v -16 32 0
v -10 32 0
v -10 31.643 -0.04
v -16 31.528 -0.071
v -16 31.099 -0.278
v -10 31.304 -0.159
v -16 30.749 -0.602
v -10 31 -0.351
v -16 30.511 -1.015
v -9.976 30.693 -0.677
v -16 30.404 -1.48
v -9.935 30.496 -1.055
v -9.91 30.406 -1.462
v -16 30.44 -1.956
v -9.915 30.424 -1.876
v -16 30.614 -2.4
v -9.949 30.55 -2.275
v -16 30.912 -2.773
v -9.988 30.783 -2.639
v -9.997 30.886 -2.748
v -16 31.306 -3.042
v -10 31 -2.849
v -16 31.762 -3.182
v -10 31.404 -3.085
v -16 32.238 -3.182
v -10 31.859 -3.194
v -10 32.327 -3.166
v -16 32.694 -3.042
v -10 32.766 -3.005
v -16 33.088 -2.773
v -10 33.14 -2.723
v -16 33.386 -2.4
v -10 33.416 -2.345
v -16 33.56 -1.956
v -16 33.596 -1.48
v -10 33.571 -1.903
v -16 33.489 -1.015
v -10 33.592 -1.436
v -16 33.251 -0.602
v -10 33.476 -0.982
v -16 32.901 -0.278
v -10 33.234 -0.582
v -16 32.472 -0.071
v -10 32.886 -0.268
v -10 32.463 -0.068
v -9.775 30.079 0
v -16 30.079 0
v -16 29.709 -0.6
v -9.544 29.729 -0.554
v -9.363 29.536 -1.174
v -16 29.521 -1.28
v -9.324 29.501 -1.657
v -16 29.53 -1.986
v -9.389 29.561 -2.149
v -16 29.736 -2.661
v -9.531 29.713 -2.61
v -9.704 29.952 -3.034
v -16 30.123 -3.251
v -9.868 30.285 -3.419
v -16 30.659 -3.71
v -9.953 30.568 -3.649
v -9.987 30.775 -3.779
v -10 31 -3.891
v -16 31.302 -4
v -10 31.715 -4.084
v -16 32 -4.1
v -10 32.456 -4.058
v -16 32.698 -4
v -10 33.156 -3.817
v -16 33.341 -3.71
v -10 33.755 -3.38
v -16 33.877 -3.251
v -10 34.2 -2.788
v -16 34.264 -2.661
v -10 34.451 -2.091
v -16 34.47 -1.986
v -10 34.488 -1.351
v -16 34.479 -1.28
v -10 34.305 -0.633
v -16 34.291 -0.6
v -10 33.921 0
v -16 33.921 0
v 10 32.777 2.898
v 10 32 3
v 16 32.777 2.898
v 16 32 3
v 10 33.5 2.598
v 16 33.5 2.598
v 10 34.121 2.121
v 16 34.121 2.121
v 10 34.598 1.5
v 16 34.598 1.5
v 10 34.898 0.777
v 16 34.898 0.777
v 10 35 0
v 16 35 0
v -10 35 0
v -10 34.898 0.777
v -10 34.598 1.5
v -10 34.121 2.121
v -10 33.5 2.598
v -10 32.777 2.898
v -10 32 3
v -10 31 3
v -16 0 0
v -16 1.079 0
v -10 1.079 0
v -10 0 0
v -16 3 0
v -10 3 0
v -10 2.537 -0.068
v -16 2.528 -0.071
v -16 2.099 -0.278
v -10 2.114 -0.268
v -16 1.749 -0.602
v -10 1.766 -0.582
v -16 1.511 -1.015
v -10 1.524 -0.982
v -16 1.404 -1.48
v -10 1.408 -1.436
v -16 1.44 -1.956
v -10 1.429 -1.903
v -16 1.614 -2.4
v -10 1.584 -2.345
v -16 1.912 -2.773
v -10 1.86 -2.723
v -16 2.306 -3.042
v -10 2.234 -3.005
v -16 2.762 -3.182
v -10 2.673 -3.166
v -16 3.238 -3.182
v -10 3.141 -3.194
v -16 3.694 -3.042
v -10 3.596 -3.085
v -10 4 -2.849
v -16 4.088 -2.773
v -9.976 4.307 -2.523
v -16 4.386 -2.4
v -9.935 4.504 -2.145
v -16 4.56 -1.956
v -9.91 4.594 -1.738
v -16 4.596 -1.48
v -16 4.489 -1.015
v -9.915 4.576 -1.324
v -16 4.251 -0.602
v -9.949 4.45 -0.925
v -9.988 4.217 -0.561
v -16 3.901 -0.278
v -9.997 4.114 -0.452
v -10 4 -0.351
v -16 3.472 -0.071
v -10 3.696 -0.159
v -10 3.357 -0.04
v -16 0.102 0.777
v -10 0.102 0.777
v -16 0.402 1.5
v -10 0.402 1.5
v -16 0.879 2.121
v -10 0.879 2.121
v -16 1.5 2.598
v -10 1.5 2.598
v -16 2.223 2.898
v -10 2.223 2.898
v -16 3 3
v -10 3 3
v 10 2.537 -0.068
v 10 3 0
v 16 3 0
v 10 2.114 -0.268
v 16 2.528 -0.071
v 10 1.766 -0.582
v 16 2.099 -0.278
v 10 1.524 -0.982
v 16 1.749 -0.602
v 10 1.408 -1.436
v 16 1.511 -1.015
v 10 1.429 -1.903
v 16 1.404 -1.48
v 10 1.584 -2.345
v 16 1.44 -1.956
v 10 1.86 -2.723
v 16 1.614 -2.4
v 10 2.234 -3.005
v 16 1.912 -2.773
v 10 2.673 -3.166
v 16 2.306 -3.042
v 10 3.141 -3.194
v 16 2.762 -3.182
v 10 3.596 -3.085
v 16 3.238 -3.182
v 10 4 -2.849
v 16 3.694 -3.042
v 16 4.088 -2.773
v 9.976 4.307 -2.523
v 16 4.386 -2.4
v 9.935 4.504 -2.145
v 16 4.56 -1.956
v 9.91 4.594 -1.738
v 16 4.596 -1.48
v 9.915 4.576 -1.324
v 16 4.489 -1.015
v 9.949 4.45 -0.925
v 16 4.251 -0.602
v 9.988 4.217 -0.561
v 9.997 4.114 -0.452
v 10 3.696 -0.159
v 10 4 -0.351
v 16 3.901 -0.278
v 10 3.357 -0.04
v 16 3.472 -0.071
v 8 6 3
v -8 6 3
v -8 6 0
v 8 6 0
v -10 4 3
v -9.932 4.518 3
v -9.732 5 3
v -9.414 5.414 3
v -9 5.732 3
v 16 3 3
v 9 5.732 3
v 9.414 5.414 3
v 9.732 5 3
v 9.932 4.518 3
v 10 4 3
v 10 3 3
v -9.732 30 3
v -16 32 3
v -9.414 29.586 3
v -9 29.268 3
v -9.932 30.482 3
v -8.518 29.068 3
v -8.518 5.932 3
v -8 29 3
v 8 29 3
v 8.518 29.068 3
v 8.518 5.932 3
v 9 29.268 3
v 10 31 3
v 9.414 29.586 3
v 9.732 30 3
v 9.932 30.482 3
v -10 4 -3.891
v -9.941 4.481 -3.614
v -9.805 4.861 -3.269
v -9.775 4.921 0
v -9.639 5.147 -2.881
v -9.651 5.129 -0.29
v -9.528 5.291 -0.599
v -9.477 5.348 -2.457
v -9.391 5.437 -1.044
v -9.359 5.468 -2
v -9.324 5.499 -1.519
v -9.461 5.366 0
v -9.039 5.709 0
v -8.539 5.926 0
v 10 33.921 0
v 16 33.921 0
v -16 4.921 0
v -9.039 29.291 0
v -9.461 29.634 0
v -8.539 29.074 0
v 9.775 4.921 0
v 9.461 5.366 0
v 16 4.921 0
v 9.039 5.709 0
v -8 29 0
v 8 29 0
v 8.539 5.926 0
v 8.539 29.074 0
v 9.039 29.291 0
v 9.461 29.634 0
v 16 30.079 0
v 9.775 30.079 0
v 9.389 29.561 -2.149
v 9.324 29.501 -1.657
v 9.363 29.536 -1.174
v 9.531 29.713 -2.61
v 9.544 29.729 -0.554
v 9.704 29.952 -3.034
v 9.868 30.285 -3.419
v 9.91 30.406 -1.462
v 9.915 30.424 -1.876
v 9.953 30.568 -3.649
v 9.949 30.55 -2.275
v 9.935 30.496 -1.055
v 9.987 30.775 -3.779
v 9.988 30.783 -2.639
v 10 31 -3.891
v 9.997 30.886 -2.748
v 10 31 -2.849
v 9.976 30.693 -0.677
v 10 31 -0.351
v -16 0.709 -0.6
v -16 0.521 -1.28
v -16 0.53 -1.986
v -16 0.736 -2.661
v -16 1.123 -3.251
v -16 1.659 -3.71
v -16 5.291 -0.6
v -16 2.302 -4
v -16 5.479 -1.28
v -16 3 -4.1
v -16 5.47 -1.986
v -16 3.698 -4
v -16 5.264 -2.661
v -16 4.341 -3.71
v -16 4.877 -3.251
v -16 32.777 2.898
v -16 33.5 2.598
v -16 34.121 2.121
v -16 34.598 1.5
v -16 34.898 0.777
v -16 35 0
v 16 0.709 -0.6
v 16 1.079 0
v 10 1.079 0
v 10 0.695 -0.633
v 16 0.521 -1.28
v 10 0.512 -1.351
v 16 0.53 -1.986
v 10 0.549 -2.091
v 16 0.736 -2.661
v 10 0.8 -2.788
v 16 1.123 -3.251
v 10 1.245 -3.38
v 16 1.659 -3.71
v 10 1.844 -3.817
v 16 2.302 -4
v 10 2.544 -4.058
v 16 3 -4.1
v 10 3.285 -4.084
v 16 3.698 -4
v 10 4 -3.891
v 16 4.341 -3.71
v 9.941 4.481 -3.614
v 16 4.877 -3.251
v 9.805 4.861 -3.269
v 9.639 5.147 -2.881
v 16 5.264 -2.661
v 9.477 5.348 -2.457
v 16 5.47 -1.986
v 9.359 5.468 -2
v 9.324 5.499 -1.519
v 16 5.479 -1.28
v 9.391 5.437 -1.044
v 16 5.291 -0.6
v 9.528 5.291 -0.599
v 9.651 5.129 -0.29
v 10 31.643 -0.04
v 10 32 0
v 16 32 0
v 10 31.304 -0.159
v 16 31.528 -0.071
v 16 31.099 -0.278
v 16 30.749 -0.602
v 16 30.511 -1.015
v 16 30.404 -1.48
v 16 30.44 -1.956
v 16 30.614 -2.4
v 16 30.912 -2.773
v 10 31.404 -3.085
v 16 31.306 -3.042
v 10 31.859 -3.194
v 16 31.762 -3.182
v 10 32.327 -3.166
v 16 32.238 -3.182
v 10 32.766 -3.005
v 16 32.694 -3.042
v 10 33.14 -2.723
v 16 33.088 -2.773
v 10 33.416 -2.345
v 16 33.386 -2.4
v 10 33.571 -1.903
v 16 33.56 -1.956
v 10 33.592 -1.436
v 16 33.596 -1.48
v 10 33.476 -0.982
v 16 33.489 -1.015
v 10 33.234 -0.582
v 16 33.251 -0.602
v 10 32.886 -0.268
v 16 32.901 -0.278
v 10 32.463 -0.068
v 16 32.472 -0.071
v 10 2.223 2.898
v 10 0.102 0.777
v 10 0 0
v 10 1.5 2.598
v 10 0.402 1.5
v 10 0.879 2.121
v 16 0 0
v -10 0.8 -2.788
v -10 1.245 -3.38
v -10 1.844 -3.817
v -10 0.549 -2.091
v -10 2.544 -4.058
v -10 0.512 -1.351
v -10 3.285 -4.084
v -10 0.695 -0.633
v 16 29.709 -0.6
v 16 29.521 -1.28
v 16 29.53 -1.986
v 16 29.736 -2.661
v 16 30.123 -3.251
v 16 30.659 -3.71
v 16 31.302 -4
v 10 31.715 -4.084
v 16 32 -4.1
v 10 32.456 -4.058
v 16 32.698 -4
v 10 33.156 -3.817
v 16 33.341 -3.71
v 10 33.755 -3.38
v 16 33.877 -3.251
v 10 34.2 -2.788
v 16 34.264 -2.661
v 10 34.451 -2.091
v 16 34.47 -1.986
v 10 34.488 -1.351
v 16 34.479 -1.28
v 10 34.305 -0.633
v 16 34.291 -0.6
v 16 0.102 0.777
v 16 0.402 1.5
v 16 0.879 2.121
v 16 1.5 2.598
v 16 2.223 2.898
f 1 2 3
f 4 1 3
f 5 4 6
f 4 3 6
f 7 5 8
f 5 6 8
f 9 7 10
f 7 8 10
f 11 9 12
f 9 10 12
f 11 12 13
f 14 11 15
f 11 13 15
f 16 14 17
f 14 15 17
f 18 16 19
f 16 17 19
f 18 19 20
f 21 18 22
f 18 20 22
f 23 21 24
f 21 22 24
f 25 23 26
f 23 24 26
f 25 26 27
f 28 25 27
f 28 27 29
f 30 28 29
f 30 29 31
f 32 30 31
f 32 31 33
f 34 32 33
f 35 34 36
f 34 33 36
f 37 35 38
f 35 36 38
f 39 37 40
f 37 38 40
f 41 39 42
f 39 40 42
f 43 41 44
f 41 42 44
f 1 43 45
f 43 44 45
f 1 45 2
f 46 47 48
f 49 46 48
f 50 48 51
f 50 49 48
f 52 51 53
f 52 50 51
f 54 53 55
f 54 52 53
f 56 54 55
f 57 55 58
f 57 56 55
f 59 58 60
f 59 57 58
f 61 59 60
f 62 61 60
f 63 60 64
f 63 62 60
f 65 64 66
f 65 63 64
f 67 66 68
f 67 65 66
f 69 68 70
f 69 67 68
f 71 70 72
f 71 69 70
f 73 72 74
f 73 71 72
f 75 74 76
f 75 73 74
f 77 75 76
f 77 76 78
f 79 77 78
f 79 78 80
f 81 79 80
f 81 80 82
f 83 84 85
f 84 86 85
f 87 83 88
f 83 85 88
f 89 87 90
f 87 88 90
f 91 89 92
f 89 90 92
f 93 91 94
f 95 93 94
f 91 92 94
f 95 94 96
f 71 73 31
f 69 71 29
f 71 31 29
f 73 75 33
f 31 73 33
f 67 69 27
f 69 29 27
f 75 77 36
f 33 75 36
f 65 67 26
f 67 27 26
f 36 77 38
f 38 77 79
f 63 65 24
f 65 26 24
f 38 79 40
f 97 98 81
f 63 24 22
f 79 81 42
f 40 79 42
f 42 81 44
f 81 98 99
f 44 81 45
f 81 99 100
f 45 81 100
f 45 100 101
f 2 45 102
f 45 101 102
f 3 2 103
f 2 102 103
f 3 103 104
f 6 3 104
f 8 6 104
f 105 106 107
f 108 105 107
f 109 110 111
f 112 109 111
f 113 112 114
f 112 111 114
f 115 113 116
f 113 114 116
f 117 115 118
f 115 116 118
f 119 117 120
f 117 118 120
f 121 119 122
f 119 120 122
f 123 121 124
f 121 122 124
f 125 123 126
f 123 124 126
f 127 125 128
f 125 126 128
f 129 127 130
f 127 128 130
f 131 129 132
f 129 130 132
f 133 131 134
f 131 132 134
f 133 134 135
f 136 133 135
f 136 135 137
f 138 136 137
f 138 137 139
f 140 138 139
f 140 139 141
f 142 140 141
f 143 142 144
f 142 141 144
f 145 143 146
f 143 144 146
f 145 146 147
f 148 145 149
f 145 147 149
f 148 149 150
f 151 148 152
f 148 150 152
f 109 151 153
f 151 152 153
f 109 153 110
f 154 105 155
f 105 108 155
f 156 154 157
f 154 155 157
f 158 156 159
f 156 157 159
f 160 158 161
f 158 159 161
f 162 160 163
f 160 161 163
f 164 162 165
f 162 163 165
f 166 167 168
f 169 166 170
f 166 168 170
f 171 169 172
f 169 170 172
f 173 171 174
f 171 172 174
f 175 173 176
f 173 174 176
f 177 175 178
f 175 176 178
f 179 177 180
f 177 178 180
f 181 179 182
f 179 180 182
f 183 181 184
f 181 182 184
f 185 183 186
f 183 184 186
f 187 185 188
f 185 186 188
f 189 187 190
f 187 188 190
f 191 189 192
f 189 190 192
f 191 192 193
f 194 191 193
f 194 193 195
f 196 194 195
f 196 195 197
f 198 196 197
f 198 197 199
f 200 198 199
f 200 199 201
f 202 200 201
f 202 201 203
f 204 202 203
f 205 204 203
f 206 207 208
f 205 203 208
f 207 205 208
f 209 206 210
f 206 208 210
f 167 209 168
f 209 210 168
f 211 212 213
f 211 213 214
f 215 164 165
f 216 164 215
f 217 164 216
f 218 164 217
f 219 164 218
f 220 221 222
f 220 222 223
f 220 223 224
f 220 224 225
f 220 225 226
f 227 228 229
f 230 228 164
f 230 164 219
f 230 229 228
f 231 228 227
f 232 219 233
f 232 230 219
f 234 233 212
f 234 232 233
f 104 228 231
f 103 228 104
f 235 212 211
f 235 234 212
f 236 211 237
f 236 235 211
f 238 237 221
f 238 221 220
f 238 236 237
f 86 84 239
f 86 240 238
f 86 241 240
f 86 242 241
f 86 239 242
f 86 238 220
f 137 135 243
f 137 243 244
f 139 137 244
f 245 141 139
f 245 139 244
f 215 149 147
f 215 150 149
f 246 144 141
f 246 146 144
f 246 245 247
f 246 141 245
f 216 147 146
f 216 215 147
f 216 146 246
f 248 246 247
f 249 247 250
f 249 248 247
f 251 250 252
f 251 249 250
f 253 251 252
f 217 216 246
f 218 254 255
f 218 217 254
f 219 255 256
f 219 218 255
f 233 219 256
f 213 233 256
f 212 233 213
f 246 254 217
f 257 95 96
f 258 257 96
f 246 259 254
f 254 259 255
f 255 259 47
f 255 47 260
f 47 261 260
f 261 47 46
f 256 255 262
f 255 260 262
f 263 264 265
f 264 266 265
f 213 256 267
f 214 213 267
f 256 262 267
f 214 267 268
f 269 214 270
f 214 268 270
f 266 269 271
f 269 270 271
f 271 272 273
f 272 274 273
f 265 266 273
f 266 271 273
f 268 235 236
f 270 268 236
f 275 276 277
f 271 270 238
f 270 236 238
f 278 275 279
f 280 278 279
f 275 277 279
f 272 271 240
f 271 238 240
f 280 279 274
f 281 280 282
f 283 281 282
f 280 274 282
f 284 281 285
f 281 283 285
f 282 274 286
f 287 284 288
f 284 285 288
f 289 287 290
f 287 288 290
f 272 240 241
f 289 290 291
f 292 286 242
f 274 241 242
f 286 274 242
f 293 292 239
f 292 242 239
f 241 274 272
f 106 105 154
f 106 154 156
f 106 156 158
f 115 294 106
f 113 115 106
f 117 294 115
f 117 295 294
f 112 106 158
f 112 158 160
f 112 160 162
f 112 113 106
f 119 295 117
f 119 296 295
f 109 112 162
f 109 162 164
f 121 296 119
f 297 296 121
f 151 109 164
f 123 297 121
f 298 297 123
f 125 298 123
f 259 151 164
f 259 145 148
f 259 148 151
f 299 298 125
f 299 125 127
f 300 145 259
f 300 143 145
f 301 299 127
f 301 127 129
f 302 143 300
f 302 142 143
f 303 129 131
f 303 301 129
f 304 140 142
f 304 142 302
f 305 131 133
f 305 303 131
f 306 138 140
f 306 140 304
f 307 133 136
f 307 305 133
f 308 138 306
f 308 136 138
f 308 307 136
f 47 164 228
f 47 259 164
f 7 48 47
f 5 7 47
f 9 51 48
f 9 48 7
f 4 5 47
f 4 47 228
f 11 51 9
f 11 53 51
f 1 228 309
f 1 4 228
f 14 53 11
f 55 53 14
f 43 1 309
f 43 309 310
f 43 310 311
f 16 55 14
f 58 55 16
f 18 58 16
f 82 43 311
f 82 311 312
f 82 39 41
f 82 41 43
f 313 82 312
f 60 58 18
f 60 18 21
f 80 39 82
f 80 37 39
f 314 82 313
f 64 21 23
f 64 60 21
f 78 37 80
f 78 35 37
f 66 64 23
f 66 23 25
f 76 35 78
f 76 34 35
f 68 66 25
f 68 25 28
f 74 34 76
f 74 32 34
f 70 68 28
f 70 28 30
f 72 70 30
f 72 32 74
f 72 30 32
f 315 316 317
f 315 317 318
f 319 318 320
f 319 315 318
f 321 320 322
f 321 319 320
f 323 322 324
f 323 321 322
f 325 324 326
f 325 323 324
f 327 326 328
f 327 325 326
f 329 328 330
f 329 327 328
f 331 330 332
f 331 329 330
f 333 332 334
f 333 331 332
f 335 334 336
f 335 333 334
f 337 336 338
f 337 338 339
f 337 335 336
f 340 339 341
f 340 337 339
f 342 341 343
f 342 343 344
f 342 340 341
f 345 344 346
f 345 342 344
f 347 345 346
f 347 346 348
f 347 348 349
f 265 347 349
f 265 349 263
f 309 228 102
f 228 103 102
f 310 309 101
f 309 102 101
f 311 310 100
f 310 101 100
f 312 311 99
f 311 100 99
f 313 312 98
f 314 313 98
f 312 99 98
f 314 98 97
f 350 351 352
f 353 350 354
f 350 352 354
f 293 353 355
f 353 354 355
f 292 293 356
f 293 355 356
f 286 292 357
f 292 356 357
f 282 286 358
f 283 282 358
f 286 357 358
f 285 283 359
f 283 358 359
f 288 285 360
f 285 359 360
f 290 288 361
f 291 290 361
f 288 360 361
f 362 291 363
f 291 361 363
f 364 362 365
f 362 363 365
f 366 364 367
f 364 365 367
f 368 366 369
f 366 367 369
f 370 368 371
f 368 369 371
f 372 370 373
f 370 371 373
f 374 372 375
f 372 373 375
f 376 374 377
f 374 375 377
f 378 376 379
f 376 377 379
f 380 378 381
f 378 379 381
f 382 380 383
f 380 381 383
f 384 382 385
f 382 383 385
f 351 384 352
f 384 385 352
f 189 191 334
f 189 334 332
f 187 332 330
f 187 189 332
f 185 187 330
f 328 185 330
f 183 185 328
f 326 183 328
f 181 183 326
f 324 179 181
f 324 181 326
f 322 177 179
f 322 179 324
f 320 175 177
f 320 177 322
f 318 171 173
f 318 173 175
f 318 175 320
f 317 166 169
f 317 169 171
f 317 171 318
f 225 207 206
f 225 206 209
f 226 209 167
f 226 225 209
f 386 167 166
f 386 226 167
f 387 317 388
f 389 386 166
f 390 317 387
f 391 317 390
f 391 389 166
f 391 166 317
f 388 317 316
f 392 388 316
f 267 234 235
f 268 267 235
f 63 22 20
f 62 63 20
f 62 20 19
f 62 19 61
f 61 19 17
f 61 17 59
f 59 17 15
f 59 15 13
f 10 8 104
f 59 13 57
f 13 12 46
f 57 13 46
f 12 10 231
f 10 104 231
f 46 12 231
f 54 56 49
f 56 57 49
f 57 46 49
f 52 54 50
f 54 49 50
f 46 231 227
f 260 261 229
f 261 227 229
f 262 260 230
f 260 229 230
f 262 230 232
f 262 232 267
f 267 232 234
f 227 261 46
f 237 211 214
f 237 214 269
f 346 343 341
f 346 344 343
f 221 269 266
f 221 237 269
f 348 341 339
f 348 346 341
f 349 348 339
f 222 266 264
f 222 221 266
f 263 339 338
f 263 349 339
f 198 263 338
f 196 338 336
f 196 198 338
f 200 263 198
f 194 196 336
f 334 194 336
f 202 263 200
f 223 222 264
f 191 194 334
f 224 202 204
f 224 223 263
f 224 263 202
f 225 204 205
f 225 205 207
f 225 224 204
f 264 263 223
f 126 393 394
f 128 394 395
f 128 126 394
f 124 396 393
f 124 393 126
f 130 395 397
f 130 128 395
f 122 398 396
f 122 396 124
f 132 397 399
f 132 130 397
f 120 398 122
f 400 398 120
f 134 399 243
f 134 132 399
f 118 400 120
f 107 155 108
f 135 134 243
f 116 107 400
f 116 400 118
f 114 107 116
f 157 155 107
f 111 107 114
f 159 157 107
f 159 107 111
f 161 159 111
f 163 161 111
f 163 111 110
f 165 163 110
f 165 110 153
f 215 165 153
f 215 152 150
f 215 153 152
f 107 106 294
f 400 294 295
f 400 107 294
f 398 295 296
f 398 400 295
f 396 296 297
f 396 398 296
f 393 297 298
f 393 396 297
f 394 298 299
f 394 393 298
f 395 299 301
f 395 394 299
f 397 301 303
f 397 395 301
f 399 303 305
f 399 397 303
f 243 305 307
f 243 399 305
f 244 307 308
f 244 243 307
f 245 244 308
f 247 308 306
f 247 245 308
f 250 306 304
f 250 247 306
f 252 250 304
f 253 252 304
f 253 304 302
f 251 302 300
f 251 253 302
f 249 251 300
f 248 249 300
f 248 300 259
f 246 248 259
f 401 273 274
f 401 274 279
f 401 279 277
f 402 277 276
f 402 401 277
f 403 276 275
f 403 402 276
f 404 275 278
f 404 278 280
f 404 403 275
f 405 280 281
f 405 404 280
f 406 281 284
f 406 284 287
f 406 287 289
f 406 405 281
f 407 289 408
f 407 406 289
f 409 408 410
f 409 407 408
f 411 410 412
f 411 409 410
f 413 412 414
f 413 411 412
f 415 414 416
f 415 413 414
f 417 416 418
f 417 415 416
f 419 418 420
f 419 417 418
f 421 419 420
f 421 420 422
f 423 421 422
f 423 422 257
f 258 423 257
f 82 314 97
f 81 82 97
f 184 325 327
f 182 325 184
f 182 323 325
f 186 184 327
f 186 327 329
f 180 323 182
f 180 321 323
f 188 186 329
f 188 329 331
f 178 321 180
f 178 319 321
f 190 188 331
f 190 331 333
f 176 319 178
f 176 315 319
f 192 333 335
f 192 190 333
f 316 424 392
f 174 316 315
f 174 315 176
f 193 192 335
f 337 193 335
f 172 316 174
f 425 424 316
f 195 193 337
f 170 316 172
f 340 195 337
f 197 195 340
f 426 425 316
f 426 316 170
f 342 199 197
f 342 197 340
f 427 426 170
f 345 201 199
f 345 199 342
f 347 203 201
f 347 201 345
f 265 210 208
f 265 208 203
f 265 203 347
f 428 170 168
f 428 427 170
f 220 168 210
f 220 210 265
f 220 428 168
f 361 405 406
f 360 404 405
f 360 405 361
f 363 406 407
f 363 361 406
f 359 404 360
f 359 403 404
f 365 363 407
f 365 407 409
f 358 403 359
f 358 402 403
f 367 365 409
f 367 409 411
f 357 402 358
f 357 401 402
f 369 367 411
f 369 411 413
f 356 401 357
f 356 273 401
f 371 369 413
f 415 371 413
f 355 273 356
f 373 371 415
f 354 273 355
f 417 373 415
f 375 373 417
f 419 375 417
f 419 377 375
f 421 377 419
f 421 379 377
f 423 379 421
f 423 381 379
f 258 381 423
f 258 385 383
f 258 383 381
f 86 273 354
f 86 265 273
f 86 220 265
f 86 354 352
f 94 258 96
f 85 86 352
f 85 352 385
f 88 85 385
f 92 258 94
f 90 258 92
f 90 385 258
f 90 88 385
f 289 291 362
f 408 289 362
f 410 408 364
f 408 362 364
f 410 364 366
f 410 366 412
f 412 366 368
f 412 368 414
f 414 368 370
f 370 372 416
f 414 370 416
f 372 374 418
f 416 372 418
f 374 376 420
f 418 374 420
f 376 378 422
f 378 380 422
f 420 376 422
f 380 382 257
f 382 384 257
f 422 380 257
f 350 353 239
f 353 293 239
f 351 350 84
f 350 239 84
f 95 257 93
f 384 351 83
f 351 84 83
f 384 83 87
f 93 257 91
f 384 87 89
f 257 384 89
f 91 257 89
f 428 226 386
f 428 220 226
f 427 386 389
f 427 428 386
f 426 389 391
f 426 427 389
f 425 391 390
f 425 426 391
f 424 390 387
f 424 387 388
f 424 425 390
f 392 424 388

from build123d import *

# Parameters (mm, degrees)
SKETCH1_W                       = 32
SKETCH1_H                       = 35
BOSS_EXTRUDE1_DEPTH             = 3
BOSS_EXTRUDE2_REACH             = 40.601
SKETCH4_R                       = 2.5
SKETCH4_R_2                     = 1.6
BOSS_EXTRUDE2_DIRECTION_2_REACH = 40.601
CUT_EXTRUDE1_DEPTH              = 40.133233958
FILLET1_R                       = 3


with BuildPart() as part:
    # Sketch1 → Boss-Extrude1 (new body)
    with BuildSketch(Plane.XY):
        with Locations((0, 17.5)):
            Rectangle(SKETCH1_W, SKETCH1_H)
    extrude(amount=BOSS_EXTRUDE1_DEPTH)

    # Boss-Extrude2: up to this face of the body (flat: up to its plane)
    boss_extrude2_end = Plane(part.part.faces().sort_by_distance((16, 17.5, 1.5))[0])
    # Sketch4 → Boss-Extrude2 (add, up to the picked face)
    with BuildSketch(Plane(origin=(0, 0, 0), x_dir=(0, 0, -1), z_dir=(1, 0, 0)), mode=Mode.PRIVATE) as boss_extrude2_sk1:
        with Locations((1.6, 32)):
            Circle(SKETCH4_R)
        with Locations(Location((1.6, 32, 0), (0, 0, 180))):
            Circle(SKETCH4_R_2, mode=Mode.SUBTRACT)
    boss_extrude2_tool1 = split(extrude(boss_extrude2_sk1.sketch, amount=BOSS_EXTRUDE2_REACH, mode=Mode.PRIVATE), bisect_by=boss_extrude2_end, keep=Keep.BOTH, mode=Mode.PRIVATE)
    # Sketch4 → Boss-Extrude2 (add, up to the picked face)
    with BuildSketch(Plane(origin=(0, 0, 0), x_dir=(0, 0, -1), z_dir=(1, 0, 0)), mode=Mode.PRIVATE) as boss_extrude2_sk2:
        with Locations((1.6, 3)):
            Circle(SKETCH4_R)
        with Locations(Location((1.6, 3, 0), (0, 0, 180))):
            Circle(SKETCH4_R_2, mode=Mode.SUBTRACT)
    boss_extrude2_tool2 = split(extrude(boss_extrude2_sk2.sketch, amount=BOSS_EXTRUDE2_REACH, mode=Mode.PRIVATE), bisect_by=boss_extrude2_end, keep=Keep.BOTH, mode=Mode.PRIVATE)
    add(boss_extrude2_tool1.solids().sort_by(Axis((0, 32, 0.829289), (1, 0, 0)))[0])
    add(boss_extrude2_tool2.solids().sort_by(Axis((0, 3, 0.829289), (1, 0, 0)))[0])

    # Boss-Extrude2 direction 2: up to this face of the body (flat: up to its plane)
    boss_extrude2_direction_2_end = Plane(part.part.faces().sort_by_distance((-16, 17.5, 1.5))[0])
    # Sketch4 → Boss-Extrude2 direction 2 (add, up to the picked face)
    with BuildSketch(Plane(origin=(0, 0, 0), x_dir=(0, 0, -1), z_dir=(1, 0, 0)), mode=Mode.PRIVATE) as boss_extrude2_direction_2_sk1:
        with Locations((1.6, 32)):
            Circle(SKETCH4_R)
        with Locations(Location((1.6, 32, 0), (0, 0, 180))):
            Circle(SKETCH4_R_2, mode=Mode.SUBTRACT)
    boss_extrude2_direction_2_tool1 = split(extrude(boss_extrude2_direction_2_sk1.sketch, amount=-BOSS_EXTRUDE2_DIRECTION_2_REACH, mode=Mode.PRIVATE), bisect_by=boss_extrude2_direction_2_end, keep=Keep.BOTH, mode=Mode.PRIVATE)
    # Sketch4 → Boss-Extrude2 direction 2 (add, up to the picked face)
    with BuildSketch(Plane(origin=(0, 0, 0), x_dir=(0, 0, -1), z_dir=(1, 0, 0)), mode=Mode.PRIVATE) as boss_extrude2_direction_2_sk2:
        with Locations((1.6, 3)):
            Circle(SKETCH4_R)
        with Locations(Location((1.6, 3, 0), (0, 0, 180))):
            Circle(SKETCH4_R_2, mode=Mode.SUBTRACT)
    boss_extrude2_direction_2_tool2 = split(extrude(boss_extrude2_direction_2_sk2.sketch, amount=-BOSS_EXTRUDE2_DIRECTION_2_REACH, mode=Mode.PRIVATE), bisect_by=boss_extrude2_direction_2_end, keep=Keep.BOTH, mode=Mode.PRIVATE)
    add(boss_extrude2_direction_2_tool1.solids().sort_by(Axis((0, 32, 0.829289), (-1, 0, 0)))[0])
    add(boss_extrude2_direction_2_tool2.solids().sort_by(Axis((0, 3, 0.829289), (-1, 0, 0)))[0])

    # Sketch5 → Cut-Extrude1 (cut, through all)
    with BuildSketch(Plane.XY.offset(3)):
        with BuildLine():
            Line((-10, 35), (-10, 31))
            ThreePointArc((-10, 31), (-9.414213562, 29.585786438), (-8, 29))
            Line((-8, 29), (8, 29))
            ThreePointArc((8, 29), (9.414213562, 29.585786438), (10, 31))
            Line((10, 31), (10, 35))
            Line((10, 35), (-10, 35))
        make_face()
        with BuildLine():
            Line((-10, 0), (-10, 4))
            ThreePointArc((-10, 4), (-9.414213562, 5.414213562), (-8, 6))
            Line((-8, 6), (8, 6))
            ThreePointArc((8, 6), (9.414213562, 5.414213562), (10, 4))
            Line((10, 4), (10, 0))
            Line((10, 0), (-10, 0))
        make_face()
    extrude(amount=-CUT_EXTRUDE1_DEPTH, mode=Mode.SUBTRACT)

    # Fillet1
    fillet1_edges = [part.edges().sort_by_distance(p)[0] for p in [
        (13, 0, 3),
        (-13, 0, 3),
        (13, 35, 3),
        (-13, 35, 3),
    ]]
    fillet(fillet1_edges, radius=FILLET1_R - 0.0001)  # a hair under: the kernel refuses the full size


solid = part.part
